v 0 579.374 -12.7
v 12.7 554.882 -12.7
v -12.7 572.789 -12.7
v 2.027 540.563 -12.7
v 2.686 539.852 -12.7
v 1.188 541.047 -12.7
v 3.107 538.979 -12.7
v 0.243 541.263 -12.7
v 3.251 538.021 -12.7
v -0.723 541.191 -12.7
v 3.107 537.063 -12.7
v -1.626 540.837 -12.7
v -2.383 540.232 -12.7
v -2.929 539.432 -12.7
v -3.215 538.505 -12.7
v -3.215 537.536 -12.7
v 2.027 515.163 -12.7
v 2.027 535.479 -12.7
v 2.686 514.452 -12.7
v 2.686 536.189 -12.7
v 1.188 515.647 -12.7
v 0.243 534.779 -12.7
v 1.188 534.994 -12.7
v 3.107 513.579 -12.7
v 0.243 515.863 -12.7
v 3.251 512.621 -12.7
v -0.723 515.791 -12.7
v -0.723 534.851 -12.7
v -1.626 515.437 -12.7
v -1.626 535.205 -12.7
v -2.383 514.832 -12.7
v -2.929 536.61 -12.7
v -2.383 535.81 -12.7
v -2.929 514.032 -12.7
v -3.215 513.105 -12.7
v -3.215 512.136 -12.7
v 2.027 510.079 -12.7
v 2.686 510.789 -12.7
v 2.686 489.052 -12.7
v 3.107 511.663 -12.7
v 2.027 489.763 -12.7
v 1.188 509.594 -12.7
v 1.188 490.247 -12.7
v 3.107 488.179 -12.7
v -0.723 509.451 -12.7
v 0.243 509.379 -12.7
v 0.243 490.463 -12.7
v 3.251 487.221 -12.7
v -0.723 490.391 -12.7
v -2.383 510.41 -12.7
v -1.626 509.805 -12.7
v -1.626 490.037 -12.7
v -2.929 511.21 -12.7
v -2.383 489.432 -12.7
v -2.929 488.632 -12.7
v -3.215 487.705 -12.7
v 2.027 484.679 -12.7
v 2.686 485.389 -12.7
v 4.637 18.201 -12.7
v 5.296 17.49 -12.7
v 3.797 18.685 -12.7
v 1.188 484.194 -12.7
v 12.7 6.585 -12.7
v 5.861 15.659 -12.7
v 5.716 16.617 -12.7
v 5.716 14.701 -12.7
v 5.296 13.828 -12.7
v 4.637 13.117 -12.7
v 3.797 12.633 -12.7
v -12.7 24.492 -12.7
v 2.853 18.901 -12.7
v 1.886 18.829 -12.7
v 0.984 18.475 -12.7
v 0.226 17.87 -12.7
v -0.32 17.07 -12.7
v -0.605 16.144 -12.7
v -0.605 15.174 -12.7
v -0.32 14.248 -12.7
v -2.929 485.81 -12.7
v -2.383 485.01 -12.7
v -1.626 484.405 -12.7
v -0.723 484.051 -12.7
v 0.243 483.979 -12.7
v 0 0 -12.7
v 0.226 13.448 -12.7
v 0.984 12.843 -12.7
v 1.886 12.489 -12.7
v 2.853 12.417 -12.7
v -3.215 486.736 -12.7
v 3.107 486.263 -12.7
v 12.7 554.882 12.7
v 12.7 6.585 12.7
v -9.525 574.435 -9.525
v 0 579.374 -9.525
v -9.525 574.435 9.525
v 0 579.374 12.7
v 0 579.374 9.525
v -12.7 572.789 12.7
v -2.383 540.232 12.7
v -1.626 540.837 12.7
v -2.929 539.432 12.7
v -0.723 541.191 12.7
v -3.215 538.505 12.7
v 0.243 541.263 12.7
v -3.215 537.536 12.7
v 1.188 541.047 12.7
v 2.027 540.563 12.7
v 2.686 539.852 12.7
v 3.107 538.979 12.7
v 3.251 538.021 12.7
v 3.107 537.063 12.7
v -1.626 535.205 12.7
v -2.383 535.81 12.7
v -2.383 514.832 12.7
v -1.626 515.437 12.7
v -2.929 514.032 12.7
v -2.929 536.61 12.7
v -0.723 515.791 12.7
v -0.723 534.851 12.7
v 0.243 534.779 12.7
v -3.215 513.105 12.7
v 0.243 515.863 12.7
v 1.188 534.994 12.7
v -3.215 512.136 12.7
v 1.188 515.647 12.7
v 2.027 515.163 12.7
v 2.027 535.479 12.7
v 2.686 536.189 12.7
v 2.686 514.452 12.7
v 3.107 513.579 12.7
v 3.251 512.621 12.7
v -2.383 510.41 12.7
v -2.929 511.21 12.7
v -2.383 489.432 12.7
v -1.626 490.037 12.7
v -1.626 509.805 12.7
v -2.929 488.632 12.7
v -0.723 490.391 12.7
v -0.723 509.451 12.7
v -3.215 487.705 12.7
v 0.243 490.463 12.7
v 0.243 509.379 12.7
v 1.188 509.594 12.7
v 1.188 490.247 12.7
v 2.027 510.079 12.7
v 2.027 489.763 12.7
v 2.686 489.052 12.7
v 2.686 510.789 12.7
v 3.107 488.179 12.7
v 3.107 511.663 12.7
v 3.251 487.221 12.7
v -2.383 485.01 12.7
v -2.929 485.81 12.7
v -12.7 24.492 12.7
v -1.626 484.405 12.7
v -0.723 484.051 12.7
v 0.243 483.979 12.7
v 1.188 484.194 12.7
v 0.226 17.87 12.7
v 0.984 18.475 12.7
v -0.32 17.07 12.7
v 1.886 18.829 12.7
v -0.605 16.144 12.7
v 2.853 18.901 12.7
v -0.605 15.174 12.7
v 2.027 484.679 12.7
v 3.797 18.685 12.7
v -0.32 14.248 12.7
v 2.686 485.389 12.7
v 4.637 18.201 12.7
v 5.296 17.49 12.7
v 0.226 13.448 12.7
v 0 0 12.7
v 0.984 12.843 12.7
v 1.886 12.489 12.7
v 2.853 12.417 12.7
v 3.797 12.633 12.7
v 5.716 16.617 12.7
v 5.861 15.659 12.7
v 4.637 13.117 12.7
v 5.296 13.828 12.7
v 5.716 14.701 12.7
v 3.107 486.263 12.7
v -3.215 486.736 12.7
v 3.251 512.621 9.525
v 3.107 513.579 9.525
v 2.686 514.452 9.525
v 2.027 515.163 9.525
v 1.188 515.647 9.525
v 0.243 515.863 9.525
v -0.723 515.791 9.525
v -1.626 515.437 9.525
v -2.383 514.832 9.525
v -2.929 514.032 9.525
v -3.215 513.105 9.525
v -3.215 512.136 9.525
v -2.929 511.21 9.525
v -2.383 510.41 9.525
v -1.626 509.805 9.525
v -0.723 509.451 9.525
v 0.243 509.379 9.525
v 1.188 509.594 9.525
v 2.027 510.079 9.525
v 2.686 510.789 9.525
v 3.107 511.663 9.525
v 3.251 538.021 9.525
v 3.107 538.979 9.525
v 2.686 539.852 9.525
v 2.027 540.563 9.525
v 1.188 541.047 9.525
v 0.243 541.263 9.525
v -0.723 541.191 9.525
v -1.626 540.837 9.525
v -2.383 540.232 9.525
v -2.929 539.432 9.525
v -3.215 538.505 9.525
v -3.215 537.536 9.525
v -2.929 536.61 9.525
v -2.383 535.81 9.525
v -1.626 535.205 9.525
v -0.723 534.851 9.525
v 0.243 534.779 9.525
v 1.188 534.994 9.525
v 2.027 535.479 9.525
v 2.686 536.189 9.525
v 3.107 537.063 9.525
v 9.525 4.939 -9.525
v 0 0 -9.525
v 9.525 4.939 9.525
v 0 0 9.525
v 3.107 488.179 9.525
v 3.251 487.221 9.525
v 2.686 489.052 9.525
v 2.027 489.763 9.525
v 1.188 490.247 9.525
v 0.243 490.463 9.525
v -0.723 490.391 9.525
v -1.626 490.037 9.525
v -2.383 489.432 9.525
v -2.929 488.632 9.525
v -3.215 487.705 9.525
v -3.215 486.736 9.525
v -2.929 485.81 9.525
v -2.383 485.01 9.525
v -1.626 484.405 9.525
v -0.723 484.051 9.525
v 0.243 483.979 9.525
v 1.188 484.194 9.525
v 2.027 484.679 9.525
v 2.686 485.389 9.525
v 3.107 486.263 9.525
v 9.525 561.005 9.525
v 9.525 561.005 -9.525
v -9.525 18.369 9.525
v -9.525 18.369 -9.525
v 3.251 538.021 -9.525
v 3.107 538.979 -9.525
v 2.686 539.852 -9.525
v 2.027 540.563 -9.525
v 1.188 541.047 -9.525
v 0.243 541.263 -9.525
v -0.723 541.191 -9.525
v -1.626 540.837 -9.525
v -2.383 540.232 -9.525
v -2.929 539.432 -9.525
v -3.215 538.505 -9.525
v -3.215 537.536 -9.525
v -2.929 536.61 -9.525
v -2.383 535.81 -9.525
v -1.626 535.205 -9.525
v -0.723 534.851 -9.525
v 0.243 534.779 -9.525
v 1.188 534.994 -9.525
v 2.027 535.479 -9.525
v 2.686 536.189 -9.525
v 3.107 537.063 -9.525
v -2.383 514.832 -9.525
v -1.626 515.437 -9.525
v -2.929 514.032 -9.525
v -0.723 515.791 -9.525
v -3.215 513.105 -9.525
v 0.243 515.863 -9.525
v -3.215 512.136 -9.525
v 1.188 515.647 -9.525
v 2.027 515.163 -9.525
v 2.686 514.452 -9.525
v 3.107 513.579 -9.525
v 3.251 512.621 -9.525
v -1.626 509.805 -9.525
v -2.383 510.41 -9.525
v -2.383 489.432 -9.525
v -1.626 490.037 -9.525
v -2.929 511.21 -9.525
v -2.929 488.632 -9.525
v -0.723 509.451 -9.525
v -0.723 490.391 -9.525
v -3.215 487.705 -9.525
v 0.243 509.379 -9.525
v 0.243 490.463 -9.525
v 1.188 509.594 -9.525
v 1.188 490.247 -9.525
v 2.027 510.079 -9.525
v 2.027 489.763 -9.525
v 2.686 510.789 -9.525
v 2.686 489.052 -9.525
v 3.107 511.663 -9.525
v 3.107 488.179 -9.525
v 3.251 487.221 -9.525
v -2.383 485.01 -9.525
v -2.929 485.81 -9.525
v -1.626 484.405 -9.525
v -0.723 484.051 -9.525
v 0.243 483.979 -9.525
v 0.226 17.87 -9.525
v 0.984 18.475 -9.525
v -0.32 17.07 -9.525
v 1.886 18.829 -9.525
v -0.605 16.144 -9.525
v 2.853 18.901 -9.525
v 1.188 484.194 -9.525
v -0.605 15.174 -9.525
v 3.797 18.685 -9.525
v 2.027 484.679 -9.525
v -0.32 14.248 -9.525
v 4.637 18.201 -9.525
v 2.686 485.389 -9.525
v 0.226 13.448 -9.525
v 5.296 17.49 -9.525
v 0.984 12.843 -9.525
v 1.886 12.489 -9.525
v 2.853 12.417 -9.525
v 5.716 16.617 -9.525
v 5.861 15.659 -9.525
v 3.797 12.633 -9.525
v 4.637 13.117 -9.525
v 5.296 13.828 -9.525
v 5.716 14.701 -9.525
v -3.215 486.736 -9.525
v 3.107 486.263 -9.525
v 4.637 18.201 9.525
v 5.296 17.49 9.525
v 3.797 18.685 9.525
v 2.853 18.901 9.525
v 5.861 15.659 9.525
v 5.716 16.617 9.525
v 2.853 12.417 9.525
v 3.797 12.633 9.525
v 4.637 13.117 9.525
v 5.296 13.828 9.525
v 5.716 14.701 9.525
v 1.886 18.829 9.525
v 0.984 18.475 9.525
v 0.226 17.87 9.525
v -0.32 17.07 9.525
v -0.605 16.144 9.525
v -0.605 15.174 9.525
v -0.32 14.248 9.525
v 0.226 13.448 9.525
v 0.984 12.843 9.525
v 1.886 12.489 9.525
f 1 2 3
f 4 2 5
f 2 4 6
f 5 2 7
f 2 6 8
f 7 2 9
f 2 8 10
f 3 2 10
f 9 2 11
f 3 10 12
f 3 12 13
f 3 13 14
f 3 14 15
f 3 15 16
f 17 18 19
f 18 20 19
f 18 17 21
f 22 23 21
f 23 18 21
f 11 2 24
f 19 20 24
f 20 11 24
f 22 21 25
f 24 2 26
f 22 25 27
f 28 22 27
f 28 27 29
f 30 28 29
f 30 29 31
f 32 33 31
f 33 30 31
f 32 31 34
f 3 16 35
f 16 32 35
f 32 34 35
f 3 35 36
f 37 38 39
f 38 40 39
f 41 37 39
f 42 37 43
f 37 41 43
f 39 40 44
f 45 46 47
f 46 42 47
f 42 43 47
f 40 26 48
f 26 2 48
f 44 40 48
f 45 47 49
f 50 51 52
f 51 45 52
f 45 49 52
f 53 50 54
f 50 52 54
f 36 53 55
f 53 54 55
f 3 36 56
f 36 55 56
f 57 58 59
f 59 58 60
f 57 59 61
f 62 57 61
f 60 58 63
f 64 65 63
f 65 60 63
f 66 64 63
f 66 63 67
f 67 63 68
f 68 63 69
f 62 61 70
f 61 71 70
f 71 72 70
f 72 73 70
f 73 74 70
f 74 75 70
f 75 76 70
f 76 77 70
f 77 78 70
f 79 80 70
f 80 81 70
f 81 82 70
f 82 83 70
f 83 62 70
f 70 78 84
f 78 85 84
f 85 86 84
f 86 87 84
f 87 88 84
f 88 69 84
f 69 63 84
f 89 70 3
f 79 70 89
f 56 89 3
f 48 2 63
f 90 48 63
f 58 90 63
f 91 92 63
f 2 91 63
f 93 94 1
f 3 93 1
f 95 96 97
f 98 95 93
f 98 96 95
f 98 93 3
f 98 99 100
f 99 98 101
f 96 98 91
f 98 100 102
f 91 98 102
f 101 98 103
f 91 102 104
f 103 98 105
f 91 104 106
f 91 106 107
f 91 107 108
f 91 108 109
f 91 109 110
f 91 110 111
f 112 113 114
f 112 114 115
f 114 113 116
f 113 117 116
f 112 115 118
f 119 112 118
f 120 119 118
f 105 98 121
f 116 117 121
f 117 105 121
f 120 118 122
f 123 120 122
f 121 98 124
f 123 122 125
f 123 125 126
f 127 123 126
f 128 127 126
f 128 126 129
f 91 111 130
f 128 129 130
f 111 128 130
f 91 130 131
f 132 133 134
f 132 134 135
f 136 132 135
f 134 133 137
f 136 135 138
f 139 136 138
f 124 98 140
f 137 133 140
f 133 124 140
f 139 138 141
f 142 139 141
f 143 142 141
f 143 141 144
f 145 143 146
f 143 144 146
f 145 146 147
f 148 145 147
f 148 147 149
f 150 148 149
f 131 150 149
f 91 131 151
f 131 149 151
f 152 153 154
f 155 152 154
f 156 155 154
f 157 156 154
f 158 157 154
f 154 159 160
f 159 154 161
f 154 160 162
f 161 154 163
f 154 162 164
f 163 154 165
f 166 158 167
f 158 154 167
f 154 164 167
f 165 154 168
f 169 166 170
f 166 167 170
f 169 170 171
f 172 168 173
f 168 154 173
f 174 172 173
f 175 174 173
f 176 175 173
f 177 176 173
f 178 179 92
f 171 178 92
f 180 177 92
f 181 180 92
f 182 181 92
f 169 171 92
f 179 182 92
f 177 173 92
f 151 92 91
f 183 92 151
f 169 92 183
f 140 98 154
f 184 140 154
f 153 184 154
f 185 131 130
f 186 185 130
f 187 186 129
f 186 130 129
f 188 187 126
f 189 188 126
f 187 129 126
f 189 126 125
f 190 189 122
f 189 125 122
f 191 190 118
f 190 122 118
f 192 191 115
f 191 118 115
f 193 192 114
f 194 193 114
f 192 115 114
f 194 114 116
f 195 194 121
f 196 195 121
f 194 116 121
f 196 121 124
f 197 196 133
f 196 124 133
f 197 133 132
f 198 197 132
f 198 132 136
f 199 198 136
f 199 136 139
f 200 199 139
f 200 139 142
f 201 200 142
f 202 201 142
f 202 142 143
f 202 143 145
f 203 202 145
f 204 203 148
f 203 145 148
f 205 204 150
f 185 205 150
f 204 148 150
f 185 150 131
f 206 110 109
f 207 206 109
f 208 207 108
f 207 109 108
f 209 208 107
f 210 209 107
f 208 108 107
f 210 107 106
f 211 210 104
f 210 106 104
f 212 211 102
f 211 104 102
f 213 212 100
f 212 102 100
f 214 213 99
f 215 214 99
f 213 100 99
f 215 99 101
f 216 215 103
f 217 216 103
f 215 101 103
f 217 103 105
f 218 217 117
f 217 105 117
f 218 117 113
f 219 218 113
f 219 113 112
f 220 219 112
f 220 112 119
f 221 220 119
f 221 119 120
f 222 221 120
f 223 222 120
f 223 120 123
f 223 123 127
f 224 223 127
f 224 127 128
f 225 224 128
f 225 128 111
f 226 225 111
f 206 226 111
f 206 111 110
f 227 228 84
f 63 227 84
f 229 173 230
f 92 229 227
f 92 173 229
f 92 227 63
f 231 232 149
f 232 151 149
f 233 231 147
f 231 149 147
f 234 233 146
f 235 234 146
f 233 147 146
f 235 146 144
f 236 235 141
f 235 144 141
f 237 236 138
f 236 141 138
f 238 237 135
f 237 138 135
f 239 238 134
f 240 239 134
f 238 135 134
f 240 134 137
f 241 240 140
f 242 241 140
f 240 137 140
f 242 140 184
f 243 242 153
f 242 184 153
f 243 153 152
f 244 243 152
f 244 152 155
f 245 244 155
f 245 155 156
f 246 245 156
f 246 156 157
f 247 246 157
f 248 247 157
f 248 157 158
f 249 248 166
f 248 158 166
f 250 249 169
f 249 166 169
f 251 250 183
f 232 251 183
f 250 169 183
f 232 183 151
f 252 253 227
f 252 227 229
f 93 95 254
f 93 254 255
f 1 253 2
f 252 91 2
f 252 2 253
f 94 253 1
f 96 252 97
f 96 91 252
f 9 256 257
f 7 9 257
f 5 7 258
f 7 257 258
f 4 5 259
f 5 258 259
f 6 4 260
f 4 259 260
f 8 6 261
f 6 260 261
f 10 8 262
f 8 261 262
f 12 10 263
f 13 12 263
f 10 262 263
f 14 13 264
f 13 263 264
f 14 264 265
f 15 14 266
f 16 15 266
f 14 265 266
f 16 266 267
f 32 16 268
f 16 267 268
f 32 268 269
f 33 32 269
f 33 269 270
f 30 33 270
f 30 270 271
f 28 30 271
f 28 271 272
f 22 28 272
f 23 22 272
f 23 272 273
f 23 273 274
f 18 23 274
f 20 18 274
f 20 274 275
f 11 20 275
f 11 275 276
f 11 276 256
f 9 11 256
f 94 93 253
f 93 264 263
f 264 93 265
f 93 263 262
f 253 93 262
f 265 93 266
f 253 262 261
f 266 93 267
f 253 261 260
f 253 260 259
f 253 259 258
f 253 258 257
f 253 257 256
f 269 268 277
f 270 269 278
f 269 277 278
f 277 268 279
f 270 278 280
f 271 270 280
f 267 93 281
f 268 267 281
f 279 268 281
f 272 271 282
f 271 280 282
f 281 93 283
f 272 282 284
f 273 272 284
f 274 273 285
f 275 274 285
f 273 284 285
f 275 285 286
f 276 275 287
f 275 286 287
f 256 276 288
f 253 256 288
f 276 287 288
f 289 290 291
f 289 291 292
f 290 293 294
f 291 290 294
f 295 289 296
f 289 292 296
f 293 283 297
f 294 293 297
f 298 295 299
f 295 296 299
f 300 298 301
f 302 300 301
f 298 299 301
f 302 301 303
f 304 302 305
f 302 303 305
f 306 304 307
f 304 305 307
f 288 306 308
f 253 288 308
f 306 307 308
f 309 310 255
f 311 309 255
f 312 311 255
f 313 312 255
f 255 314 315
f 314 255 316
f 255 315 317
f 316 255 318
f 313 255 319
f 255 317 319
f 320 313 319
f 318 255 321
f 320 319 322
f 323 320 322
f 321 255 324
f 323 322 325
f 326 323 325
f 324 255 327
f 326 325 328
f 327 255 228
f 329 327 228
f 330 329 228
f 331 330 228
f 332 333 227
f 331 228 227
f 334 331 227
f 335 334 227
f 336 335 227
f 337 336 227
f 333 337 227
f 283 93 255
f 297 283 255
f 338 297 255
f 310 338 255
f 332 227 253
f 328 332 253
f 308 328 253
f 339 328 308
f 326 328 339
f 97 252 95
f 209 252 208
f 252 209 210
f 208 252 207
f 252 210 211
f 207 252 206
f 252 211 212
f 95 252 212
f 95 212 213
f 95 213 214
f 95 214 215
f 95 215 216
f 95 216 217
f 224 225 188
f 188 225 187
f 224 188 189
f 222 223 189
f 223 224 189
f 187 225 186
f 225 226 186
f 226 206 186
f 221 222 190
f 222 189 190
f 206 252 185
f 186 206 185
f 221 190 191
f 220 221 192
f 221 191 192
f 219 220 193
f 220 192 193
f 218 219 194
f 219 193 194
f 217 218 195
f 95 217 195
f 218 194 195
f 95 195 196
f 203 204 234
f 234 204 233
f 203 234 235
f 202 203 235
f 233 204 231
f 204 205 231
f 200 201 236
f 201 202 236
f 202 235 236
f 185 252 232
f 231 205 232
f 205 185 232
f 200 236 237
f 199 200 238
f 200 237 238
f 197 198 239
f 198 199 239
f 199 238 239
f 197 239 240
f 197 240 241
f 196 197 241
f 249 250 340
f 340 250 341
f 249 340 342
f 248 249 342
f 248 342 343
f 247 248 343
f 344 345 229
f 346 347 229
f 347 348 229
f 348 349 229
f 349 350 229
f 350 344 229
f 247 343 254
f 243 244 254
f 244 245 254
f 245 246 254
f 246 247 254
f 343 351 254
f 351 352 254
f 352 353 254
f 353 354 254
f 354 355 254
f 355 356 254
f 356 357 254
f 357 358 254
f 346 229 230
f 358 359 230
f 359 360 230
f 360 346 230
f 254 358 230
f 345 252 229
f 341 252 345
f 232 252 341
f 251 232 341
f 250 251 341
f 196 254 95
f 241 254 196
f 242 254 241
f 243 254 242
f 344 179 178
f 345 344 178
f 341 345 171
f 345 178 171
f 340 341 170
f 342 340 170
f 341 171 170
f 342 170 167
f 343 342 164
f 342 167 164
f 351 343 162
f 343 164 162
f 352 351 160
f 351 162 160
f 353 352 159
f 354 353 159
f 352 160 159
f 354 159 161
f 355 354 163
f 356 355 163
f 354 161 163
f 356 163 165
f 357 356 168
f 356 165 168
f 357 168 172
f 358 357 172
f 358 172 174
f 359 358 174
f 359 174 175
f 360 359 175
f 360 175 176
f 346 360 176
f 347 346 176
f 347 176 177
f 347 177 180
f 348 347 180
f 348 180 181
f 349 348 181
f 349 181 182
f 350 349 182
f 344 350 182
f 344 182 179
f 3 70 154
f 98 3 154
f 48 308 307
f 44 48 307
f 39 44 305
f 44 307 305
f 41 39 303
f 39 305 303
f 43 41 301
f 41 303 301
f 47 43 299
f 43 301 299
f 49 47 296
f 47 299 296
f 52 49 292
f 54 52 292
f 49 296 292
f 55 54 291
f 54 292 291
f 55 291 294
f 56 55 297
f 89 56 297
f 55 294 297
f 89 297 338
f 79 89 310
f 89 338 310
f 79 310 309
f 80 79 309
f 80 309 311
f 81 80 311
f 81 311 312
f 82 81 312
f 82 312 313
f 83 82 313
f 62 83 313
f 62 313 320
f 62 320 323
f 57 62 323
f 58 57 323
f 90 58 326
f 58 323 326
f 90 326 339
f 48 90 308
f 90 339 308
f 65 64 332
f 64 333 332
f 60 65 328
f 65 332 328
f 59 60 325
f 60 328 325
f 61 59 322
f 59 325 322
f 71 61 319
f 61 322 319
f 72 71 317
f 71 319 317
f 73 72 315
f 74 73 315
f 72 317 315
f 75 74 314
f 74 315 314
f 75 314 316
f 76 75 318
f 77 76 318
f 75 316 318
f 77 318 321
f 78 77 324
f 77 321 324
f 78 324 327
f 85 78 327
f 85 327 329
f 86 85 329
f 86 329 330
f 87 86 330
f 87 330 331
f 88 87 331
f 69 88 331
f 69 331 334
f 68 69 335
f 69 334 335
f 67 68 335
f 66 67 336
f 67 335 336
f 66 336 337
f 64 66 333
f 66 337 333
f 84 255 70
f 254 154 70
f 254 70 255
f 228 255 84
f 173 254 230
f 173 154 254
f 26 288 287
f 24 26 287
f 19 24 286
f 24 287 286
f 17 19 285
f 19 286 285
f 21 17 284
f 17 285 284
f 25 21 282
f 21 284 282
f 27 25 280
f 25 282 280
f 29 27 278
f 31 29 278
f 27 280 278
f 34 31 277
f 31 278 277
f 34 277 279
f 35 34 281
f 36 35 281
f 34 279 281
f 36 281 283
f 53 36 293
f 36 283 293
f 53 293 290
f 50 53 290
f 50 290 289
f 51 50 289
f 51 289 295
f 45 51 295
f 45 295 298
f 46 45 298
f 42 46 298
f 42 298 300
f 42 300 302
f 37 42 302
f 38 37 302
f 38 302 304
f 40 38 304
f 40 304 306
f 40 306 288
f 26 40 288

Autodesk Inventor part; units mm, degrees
ref_plane "YZ Plane" through (0, 0, 0) normal (1, 0, 0) x (0, 1, 0)
ref_plane "XZ Plane" through (0, 0, 0) normal (0, 1, 0) x (-1, 0, 0)
ref_plane "XY Plane" through (0, 0, 0) normal (0, 0, 1) x (1, 0, 0)
sketch "Sketch1" plane through (0, 0, 0) normal (0, 1, 0) x (-1, 0, 0)
  line L0 (-12.7, -12.7) -> (12.7, -12.7)
  line L1 (12.7, -12.7) -> (12.7, 12.7)
  line L2 (12.7, 12.7) -> (-12.7, 12.7)
  line L3 (-12.7, 12.7) -> (-12.7, -12.7)
  line L4 (-12.7, -12.7) -> (12.7, 12.7) construction
  line L5 (12.7, -12.7) -> (-12.7, 12.7) construction
  line L6 (9.525, 9.525) -> (9.525, -9.525)
  line L7 (9.525, -9.525) -> (-9.525, -9.525)
  line L8 (-9.525, -9.525) -> (-9.525, 9.525)
  line L9 (-9.525, 9.525) -> (9.525, 9.525)
  point P0 (0, 0)
  dimension "d0" = 25.4
  dimension "d1" = 25.4
  dimension "d2" = 3.175
extrude "Extrusion1" add sketch "Sketch1" along normal blind 579.374
sketch "Sketch4" plane through (-12.7, 0, 12.7) normal (0, 0, 1) x (1, 0, 0)
  line L0 (249.4631, 122.7685) -> (12.7, 579.374)
  line L1 (12.7, 579.374) -> (-224.0631, 456.6055)
  line L2 (-224.0631, 456.6055) -> (12.7, 0)
  line L3 (12.7, 0) -> (249.4631, 122.7685)
  line L4 (0, 0) -> (25.4, 0) projected
  line L5 (0, 579.374) -> (25.4, 579.374) projected
  line L6 (0, 0) -> (25.4, 0) projected
  line L7 (25.4, 0) -> (25.4, 579.374) projected
  line L8 (0, 579.374) -> (25.4, 579.374) projected
  line L9 (0, 0) -> (0, 579.374) projected
  point P0 (0, 24.4924)
  point P1 (25.4, 6.5853)
  point P2 (0, 572.7887)
  point P3 (25.4, 554.8816)
  dimension "d13" = 266.7
extrude "Extrusion4" cut sketch "Sketch4" against normal blind 370.4968 contours L0 L5 L7 | L7 L4 L3 | L1 L9 L5 | L4 L9 L2
sketch "Sketch6" plane through (12.7, 6.5853, 12.7) normal (0, 0, 1) x (1, 0, 0)
  line L0 (-24.3922, 15.9636) -> (-46.9411, 4.2713) construction
  line L1 (-46.9411, 4.2713) -> (-35.2489, -18.2776) construction
  line L2 (-35.2489, -18.2776) -> (-12.7, -6.5853) construction
  line L3 (-12.7, -6.5853) -> (-25.4, 17.9071) construction
  line L4 (-25.4, 17.9071) -> (-12.7, -6.5853) construction
  line L5 (-46.9411, 4.2713) -> (-12.7, -6.5853) construction
  circle A0 centre (-29.8206, -1.157) radius 3.2512 construction
  circle A1 centre (-10.0903, 9.0737) radius 3.2512
  line L6 (-41.095, -7.0031) -> (-4.5992, 11.921) construction
  dimension "d21" = 25.4
  dimension "d22" = 25.4
  dimension "d23" = 6.5024
  dimension "d24" = 6.5024
  dimension "d25" = 22.225
extrude "Extrusion6" cut sketch "Sketch6" against normal blind 25.4
sketch "Sketch7" plane through (12.7, 6.5853, 12.7) normal (0, 0, 1) x (1, 0, 0)
  line L0 (0, 548.2963) -> (-12.7, 572.7887) construction
  line L1 (-12.7, 572.7887) -> (36.992, 476.956) construction
  line L2 (36.992, 476.956) -> (59.5409, 488.6482) construction
  line L3 (59.5409, 488.6482) -> (9.8489, 584.4809) construction
  line L4 (9.8489, 584.4809) -> (-12.7, 572.7887) construction
  circle A0 centre (42.4203, 494.0765) radius 3.2512 construction
  circle A1 centre (30.7281, 516.6254) radius 3.2512 construction
  circle A2 centre (19.0359, 539.1743) radius 3.2512 construction
  line L5 (48.2665, 482.8021) -> (-1.4256, 578.6348) construction
  line L6 (0, 0) -> (0, 548.2963) construction
  line L7 (0, 548.2963) -> (-6.7276, 575.8856) construction
  circle A3 centre (-12.7, 480.6356) radius 3.2512
  circle A4 centre (-12.7, 506.0356) radius 3.2512
  circle A5 centre (-12.7, 531.4356) radius 3.2512
  point P0 (-12.7, -6.5853)
  dimension "d28" = 25.4
  dimension "d29" = 107.95
  dimension "d30" = 6.5024
  dimension "d31" = 44.45
  dimension "d32" = 25.4
  dimension "d33" = 25.4
  dimension "d34" = 27.408
  dimension "d35" = 166.296
extrude "Extrusion7" cut sketch "Sketch7" against normal blind 25.4
properties part number "STRU_013_BilletCrossbar2_Angled" material "Aluminum 6061"
